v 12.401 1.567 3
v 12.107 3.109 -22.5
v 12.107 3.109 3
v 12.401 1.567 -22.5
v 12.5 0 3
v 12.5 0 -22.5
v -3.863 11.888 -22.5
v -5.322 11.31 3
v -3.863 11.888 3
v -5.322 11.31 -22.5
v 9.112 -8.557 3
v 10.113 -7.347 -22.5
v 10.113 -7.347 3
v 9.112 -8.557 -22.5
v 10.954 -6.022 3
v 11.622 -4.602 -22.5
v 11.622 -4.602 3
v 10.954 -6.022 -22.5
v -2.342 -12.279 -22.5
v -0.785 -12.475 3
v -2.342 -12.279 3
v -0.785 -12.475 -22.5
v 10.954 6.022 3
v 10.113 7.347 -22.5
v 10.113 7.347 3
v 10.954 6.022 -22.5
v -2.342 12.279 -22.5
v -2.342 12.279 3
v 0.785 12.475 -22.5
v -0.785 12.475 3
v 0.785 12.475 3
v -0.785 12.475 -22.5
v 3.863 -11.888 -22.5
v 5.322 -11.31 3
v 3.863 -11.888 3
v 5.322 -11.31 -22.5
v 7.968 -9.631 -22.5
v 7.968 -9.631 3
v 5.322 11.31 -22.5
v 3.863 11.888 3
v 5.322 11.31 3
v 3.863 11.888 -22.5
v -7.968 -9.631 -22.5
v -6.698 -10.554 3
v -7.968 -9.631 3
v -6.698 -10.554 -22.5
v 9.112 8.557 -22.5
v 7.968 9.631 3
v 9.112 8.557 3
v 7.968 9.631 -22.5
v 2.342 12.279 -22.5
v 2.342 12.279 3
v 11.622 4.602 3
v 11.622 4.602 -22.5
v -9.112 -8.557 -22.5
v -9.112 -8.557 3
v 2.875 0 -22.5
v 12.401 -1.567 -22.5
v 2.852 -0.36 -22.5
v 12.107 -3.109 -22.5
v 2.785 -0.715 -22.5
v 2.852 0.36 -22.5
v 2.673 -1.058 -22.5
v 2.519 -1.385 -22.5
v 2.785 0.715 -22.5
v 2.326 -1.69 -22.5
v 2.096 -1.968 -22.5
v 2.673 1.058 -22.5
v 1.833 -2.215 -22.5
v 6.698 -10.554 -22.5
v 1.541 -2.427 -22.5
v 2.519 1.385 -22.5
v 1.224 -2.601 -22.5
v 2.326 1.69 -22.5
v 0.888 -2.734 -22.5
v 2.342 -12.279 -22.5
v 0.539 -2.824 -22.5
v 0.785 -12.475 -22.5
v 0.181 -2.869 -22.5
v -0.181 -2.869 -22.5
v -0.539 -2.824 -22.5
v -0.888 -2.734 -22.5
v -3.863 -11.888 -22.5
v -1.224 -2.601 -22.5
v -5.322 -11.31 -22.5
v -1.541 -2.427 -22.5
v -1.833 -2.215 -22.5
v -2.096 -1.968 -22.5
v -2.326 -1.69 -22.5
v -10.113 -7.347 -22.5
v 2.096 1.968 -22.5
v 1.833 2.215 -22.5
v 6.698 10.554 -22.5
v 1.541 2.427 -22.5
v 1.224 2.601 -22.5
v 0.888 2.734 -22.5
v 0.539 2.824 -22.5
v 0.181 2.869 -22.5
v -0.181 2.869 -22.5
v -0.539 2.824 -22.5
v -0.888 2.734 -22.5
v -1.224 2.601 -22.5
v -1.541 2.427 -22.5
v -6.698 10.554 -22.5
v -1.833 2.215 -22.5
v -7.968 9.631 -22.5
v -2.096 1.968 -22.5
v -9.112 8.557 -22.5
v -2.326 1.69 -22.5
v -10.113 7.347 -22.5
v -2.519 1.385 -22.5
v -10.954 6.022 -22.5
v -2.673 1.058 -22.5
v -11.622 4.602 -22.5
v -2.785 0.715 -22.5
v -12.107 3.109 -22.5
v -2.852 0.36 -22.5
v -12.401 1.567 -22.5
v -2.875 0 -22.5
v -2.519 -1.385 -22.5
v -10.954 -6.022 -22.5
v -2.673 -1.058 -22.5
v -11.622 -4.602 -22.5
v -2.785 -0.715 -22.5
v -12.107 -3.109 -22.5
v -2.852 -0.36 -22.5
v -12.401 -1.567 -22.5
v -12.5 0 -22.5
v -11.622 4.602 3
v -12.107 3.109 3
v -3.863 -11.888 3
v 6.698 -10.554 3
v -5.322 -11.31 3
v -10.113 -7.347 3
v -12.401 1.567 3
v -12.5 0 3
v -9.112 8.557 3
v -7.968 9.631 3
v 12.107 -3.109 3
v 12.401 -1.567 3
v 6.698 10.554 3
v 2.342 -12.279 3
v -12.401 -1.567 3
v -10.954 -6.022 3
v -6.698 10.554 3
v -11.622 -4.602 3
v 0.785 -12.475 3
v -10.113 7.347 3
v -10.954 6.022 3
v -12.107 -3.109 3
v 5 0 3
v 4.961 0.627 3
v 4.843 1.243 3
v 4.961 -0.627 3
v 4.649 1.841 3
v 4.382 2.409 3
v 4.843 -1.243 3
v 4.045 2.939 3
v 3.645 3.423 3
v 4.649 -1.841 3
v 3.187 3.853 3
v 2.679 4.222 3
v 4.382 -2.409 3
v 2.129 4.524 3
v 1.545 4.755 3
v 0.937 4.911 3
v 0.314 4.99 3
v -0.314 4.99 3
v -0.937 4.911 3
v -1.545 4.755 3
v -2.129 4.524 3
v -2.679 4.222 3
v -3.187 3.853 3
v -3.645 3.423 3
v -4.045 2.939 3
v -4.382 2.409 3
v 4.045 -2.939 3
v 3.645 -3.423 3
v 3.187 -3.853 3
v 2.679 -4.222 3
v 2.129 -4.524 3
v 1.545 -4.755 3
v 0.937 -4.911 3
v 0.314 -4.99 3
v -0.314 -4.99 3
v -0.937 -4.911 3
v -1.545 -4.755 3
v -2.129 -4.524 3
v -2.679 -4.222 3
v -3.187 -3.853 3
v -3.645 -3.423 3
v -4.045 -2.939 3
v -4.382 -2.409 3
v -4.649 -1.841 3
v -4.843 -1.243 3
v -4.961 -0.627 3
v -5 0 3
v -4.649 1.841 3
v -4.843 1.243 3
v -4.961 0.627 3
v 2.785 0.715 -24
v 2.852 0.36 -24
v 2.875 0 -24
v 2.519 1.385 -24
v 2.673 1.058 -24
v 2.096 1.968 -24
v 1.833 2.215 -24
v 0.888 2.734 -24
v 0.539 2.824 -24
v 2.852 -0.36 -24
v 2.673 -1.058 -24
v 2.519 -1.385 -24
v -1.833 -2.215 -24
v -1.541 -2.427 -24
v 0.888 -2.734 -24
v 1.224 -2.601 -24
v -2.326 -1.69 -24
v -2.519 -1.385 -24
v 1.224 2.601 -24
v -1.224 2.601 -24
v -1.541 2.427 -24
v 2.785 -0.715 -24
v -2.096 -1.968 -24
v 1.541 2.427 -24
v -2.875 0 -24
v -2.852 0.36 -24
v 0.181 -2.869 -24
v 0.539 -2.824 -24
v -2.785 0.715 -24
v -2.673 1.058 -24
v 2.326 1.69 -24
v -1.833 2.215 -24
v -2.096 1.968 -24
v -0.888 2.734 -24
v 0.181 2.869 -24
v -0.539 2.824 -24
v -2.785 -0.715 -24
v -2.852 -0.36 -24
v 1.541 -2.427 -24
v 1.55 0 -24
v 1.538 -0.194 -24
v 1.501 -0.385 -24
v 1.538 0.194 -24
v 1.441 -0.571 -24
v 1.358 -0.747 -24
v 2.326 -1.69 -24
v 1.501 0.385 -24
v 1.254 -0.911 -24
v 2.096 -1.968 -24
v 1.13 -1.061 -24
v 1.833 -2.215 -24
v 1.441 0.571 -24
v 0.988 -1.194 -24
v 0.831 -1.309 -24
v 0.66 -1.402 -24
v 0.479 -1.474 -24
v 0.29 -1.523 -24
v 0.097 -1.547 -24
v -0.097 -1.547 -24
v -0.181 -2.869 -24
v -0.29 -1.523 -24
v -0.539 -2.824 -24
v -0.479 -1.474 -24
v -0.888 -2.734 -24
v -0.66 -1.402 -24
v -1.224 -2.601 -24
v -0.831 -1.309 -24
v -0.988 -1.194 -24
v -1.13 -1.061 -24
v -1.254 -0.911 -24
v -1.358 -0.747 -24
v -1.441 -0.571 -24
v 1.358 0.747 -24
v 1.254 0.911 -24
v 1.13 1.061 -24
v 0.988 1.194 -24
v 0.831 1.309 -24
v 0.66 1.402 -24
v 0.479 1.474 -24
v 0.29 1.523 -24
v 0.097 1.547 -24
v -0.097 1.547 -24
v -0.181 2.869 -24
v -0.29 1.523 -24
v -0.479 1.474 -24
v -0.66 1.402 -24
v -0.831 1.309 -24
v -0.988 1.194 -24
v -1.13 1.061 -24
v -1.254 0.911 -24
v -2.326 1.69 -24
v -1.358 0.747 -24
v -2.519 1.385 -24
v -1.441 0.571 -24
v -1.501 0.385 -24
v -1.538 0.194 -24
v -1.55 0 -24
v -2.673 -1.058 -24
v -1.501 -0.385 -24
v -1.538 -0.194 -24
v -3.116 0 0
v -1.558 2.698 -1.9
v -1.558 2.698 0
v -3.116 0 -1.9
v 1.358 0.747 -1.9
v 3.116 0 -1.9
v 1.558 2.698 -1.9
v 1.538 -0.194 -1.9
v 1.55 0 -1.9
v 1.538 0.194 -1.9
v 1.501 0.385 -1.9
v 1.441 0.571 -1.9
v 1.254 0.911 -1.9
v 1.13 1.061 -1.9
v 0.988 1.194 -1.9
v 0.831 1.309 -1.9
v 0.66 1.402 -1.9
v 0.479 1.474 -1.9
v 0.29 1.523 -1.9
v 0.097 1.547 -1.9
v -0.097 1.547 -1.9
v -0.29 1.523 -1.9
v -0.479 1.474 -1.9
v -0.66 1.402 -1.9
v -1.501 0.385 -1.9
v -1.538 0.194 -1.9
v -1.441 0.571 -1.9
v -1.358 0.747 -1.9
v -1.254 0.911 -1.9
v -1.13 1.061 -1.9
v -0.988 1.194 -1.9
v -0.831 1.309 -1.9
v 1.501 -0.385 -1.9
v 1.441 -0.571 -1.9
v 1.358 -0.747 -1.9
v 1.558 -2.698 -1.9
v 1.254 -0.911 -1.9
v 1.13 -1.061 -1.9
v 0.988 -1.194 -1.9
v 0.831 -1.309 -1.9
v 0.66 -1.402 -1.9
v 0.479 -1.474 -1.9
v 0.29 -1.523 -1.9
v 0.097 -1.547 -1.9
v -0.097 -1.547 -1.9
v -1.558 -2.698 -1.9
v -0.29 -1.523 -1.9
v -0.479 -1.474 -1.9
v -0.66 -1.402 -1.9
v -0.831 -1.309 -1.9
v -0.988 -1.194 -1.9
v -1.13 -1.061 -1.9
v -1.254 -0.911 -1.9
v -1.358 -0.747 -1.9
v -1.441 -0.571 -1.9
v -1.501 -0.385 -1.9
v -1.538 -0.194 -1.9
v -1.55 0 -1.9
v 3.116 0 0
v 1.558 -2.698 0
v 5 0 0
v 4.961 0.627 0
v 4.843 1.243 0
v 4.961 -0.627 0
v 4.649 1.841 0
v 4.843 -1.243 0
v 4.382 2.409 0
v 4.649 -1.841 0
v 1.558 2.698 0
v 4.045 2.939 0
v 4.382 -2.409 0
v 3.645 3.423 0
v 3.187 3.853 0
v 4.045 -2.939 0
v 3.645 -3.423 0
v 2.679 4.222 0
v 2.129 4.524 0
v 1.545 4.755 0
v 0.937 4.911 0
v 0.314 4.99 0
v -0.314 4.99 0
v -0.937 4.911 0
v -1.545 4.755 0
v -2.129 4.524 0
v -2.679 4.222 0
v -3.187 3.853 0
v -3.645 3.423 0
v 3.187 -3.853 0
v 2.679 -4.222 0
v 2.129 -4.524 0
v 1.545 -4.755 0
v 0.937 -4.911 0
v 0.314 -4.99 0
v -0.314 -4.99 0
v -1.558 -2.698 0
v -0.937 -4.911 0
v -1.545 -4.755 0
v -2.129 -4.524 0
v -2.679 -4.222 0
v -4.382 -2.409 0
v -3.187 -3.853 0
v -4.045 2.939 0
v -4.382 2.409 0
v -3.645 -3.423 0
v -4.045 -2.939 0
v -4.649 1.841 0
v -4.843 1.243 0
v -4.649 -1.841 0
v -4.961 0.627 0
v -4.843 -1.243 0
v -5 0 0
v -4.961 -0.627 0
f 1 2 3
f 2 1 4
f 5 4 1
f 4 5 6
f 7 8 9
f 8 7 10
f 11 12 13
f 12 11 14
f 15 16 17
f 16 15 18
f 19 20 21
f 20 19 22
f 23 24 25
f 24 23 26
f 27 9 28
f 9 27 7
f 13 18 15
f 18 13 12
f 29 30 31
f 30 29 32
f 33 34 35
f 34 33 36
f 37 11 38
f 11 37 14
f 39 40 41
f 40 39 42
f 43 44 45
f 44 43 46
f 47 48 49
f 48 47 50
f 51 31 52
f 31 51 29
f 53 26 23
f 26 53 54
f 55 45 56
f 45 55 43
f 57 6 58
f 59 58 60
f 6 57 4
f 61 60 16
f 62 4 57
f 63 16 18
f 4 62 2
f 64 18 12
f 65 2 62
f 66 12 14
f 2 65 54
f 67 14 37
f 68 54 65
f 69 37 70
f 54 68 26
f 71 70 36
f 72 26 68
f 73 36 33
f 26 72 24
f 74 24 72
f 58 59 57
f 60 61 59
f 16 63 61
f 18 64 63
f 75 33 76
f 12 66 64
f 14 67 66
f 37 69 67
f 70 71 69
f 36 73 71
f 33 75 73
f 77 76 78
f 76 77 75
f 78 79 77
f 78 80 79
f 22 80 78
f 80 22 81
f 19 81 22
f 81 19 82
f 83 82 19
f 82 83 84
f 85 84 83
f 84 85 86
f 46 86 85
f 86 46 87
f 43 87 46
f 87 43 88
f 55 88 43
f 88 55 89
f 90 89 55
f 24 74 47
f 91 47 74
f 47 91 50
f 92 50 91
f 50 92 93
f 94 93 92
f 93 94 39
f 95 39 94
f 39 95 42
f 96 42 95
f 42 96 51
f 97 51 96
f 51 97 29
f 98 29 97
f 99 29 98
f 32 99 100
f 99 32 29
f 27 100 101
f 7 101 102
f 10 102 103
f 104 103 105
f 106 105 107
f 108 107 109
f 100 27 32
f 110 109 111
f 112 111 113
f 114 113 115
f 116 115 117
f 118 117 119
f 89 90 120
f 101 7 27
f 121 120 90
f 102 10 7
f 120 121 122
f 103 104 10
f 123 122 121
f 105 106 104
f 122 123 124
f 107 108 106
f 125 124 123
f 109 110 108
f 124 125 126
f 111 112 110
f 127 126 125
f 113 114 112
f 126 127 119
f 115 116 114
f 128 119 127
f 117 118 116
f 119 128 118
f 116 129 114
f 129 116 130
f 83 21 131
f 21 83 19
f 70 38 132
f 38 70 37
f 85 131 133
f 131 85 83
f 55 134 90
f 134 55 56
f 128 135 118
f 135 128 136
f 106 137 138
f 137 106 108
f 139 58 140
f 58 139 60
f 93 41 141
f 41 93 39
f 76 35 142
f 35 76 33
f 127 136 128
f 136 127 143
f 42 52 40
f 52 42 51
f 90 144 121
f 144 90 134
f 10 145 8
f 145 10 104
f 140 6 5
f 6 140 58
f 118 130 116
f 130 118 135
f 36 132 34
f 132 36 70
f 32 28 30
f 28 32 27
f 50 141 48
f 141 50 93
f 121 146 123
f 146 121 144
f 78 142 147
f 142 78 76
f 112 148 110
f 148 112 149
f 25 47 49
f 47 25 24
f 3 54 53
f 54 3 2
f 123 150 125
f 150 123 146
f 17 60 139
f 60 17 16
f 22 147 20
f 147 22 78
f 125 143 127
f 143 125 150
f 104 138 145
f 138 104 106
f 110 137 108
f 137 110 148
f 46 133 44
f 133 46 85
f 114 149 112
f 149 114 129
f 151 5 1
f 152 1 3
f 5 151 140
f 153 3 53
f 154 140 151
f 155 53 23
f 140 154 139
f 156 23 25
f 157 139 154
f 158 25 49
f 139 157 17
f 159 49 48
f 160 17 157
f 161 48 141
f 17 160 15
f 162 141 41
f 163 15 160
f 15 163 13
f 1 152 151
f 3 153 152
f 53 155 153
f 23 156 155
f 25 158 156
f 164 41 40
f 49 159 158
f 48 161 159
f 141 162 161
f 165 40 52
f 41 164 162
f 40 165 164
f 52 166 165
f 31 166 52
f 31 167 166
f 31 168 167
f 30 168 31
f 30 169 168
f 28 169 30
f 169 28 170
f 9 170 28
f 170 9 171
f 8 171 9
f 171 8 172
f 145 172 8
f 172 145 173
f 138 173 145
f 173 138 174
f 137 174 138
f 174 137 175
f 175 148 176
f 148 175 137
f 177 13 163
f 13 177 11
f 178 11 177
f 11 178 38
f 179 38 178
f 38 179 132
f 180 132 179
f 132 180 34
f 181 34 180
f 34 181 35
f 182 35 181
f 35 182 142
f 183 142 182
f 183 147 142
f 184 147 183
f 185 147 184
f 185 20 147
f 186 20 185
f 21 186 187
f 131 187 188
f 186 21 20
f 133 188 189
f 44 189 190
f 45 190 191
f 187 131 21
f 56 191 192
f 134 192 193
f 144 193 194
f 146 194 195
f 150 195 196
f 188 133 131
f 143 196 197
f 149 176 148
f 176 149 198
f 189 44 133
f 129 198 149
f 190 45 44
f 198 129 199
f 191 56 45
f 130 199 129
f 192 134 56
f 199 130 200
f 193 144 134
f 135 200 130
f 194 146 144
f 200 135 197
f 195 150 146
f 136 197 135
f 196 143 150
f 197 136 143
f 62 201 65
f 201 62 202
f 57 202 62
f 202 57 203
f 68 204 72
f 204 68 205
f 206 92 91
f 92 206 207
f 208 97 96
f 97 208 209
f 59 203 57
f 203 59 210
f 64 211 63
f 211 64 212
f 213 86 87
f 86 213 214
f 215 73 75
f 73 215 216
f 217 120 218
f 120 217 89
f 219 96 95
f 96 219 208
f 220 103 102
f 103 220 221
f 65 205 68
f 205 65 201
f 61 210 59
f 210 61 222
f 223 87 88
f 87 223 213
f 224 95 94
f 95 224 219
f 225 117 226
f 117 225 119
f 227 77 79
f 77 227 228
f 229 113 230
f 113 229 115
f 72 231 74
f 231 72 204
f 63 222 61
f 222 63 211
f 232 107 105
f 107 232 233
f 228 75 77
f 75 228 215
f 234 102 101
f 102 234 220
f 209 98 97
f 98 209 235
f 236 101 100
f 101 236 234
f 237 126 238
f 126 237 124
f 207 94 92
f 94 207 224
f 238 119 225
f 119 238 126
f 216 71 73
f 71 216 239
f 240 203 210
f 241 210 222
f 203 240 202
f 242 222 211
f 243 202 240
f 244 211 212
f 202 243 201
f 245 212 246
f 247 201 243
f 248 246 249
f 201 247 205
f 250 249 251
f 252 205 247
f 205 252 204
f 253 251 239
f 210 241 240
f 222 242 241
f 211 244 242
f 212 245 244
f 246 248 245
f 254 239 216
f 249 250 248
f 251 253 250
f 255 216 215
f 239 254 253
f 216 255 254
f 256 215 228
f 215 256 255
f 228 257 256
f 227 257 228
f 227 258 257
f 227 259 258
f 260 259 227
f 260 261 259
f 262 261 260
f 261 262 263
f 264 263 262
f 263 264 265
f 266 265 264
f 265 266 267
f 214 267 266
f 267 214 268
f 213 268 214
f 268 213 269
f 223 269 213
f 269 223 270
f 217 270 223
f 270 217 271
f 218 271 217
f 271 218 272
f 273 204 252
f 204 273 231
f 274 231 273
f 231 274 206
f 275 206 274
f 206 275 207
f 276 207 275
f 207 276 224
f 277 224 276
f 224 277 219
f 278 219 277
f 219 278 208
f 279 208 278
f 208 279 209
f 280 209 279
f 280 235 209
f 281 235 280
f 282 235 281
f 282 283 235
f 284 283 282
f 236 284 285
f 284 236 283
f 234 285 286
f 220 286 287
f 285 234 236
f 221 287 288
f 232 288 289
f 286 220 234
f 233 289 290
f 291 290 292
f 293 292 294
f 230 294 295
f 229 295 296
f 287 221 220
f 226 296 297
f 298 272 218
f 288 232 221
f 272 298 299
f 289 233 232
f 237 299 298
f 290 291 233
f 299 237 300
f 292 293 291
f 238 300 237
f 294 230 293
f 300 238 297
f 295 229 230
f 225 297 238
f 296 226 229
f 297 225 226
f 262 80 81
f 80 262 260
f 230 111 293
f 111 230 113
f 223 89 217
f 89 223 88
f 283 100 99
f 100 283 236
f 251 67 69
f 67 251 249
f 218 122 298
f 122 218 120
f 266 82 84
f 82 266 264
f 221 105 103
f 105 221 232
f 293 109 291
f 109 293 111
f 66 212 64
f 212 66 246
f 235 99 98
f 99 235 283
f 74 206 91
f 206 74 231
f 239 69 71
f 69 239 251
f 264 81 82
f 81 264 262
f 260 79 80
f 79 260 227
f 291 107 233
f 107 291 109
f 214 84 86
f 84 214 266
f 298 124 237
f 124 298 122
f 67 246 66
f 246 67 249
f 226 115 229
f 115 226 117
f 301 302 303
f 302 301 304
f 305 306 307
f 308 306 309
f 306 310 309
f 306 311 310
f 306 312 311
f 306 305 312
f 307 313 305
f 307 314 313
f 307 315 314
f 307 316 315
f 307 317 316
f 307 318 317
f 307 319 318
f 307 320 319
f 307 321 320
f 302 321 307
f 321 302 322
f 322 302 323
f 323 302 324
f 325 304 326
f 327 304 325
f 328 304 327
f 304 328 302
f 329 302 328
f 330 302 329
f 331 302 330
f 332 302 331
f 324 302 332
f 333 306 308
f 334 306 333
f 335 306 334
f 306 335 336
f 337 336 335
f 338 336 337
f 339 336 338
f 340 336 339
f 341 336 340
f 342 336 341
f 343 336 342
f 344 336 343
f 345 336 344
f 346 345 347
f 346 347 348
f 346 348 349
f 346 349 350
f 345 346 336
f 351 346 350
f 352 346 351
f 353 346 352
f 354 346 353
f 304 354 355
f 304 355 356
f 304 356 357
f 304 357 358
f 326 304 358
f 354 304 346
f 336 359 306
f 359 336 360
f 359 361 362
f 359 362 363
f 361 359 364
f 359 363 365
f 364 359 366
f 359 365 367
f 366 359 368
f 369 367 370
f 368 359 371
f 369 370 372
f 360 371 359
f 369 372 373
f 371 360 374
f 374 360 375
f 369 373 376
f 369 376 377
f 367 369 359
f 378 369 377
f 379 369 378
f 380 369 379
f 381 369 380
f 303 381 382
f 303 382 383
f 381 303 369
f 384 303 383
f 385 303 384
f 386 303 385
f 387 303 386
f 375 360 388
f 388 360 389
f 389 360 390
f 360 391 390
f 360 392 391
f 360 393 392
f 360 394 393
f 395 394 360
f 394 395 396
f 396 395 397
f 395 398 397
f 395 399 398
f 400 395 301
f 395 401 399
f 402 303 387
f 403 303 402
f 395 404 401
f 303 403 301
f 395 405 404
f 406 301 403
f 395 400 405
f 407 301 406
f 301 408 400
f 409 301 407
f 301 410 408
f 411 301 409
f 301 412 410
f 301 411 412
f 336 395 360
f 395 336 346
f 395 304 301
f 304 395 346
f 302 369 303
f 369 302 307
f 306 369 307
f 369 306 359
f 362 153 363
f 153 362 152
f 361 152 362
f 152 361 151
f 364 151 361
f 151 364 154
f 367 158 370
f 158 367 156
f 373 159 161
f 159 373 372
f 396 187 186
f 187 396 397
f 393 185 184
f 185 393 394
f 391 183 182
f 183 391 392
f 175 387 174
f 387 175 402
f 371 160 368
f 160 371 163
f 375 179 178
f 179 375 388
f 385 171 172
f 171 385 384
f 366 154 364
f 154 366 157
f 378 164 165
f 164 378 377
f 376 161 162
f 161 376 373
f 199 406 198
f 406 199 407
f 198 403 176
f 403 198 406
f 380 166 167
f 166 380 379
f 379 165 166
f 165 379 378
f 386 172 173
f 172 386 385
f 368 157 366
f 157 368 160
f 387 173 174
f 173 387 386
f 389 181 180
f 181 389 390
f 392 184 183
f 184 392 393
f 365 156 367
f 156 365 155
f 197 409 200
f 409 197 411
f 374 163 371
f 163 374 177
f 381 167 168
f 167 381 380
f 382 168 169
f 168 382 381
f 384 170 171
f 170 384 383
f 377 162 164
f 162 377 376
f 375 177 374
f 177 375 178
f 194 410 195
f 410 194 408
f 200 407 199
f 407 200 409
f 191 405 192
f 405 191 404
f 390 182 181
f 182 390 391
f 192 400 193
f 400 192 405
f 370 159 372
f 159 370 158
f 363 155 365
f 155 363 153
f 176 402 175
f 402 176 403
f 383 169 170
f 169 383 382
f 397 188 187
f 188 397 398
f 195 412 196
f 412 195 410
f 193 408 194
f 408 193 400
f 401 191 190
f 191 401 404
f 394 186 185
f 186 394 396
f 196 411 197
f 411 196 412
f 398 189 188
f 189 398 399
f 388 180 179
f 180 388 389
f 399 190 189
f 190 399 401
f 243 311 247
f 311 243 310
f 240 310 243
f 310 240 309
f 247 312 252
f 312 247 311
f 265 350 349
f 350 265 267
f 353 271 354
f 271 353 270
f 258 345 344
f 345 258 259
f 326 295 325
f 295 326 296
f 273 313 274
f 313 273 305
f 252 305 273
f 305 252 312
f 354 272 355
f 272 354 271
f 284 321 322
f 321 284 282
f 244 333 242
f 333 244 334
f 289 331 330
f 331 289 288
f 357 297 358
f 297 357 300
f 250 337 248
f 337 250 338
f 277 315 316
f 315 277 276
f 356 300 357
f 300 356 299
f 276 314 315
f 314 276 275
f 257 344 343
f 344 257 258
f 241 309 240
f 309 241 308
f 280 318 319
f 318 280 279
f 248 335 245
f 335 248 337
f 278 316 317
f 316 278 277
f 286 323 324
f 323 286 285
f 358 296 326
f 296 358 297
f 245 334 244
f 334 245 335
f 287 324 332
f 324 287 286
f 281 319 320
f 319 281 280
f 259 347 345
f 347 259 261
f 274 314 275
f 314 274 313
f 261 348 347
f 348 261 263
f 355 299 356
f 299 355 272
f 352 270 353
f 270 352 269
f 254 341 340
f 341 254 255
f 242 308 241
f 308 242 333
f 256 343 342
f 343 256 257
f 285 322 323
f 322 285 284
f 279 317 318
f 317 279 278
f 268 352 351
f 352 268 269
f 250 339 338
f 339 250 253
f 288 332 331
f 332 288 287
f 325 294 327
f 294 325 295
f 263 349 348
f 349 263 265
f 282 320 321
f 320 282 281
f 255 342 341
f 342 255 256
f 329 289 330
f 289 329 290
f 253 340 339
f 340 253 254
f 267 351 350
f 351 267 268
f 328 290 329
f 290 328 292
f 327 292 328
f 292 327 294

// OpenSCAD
$fn = 50;

difference() {
	union() {
		translate(v = [0, 0, -22.5]) {
			cylinder(h = 25.5, r = 12.5);
		}
		#translate(v = [0, 0, -24.0]) {
			cylinder(h = 24, r = 2.875);
		}
	}
	union() {
		translate(v = [0, 0, 0]) {
			rotate(a = [0, 0, 0]) {
				difference() {
					union() {
						translate(v = [0, 0, -1.9]) {
							linear_extrude(height = 1.9) {
								polygon(points = [[3.1158, 0.0], [1.5579000000000005, 2.698361953111554], [-1.5578999999999994, 2.6983619531115544], [-3.1158, 3.815754496783323e-16], [-1.5579000000000014, -2.6983619531115535], [1.557899999999998, -2.6983619531115552]]);
							}
						}
					}
					union();
				}
			}
		}
		#cylinder(h = 3, r = 5.0);
		#translate(v = [0, 0, -100.0]) {
			cylinder(h = 200, r = 1.55);
		}
	}
}
